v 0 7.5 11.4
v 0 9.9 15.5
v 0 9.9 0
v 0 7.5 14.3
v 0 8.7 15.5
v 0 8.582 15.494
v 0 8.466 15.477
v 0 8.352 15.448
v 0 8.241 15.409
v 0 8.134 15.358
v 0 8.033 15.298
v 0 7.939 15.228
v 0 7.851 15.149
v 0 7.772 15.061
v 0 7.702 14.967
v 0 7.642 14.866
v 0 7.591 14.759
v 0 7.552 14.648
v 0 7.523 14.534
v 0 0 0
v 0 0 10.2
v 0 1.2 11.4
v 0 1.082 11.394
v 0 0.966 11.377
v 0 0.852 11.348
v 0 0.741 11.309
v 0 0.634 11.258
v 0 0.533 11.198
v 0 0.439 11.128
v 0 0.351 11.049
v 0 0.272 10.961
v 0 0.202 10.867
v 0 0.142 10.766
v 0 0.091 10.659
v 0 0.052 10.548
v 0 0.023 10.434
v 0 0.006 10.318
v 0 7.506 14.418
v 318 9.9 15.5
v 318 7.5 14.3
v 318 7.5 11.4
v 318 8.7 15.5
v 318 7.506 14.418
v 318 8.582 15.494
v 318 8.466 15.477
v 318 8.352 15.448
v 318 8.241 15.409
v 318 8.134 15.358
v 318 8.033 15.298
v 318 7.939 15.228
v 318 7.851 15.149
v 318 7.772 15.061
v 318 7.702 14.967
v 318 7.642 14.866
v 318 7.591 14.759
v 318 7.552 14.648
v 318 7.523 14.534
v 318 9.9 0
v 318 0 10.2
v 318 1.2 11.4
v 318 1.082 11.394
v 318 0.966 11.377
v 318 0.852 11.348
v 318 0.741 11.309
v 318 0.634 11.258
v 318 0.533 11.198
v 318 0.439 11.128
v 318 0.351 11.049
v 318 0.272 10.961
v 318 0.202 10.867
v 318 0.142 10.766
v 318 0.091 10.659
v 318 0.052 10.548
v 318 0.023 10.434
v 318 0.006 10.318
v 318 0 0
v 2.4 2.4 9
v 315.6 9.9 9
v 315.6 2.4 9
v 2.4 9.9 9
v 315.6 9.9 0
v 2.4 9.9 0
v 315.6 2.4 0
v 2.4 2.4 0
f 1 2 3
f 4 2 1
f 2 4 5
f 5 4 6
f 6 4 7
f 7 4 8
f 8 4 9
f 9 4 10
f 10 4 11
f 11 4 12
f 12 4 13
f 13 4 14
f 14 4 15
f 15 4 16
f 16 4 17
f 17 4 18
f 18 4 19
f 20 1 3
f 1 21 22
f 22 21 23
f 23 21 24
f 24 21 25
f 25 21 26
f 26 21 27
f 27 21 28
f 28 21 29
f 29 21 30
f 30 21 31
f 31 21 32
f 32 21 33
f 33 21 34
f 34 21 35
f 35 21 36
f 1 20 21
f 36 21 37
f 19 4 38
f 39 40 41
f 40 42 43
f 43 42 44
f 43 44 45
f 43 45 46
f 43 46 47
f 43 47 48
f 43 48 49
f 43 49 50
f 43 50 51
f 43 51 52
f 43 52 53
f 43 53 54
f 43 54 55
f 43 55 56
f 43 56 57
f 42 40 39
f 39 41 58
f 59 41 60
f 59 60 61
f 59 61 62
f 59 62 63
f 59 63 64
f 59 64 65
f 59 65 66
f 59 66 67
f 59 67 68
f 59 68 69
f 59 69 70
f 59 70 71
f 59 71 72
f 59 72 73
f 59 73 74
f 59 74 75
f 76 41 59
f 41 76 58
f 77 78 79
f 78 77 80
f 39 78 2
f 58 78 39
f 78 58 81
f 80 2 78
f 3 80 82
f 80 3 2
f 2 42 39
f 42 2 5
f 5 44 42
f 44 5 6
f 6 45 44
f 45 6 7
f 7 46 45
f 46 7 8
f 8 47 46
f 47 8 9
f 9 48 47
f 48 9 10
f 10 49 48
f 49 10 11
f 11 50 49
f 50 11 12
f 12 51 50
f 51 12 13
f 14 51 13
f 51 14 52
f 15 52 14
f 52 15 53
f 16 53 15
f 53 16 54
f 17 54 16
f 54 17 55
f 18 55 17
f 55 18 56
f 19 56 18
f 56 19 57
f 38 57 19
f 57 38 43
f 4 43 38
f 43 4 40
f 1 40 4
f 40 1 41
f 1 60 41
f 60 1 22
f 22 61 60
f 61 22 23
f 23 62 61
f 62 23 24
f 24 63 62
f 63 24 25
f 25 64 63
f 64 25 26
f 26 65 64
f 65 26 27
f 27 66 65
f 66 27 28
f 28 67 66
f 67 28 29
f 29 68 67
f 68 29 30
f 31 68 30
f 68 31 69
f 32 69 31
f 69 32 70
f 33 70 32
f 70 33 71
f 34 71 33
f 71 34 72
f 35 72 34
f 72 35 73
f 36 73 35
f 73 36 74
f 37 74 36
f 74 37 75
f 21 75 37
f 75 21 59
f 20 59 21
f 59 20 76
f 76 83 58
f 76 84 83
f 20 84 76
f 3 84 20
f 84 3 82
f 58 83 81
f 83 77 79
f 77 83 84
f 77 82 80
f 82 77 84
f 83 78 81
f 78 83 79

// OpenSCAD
//Leiste mit nach vorne gewoelbter Ausbuchtung, die bis zum Boden reicht.
//Die Ausbuchtung ist nach hinten und nach unten offen.
//Profil von der Seite (vorne links, hinten rechts):
//
//        ██
//        ██
//  ████████
//  ██
//  ██
//  ██

/* [Masse] */

//Gesamthoehe der Leiste inkl. Ausbuchtung
hoehe_leiste=15.5; // [5:0.1:50]

//Hoehe der Ausbuchtung, innen gemessen vom Boden
hoehe_ausbuchtung=9; // [3:0.1:50]

//Tiefe der Ausbuchtung, innen gemessen ab Rueckseite der Leiste
tiefe_ausbuchtung=7.5; // [3:0.1:50]

//Breite der gesamten Leiste
breite_leiste=318; // [10:1:500]

//Dicke der Leiste oben und der Wand um die Ausbuchtung
dicke=2.4; // [0.4:0.1:5]

//Radius der vorderen Kante ganz oben und der vorderen Kante der Ausbuchtung
//(wird auf die Dicke und die freie Hoehe der Leiste begrenzt)
radius=1.2; // [0.1:0.1:5]

/* [Druck] */

//Welches Teil: "alles" oder ein Drittel. Links und rechts sind aussen geschlossen, die Mitte ist beidseitig offen.
teil="alles"; // [alles, links, mitte, rechts]

/* [Hidden] */

//Radius darf nicht groesser als die Wand oder die freie Hoehe der Leiste sein
r=min(radius, dicke, hoehe_leiste-hoehe_ausbuchtung-dicke);

//Segmente pro Rundung
segmente=16;

//Viertelkreis um [cx, cy] von Winkel a0 nach a1
function bogen(cx, cy, a0, a1) =
    [for(i=[0:segmente]) let(a=a0+(a1-a0)*i/segmente) [cx+r*cos(a), cy+r*sin(a)]];


module profil()
{
    polygon(concat(
        [[tiefe_ausbuchtung+dicke, hoehe_leiste]],
        //vordere Kante ganz oben
        bogen(tiefe_ausbuchtung+r, hoehe_leiste-r, 90, 180),
        [[tiefe_ausbuchtung, hoehe_ausbuchtung+dicke]],
        //vordere Kante der Ausbuchtung
        bogen(r, hoehe_ausbuchtung+dicke-r, 90, 180),
        [
            [0, 0],
            [dicke, 0],
            [dicke, hoehe_ausbuchtung],
            [tiefe_ausbuchtung+dicke, hoehe_ausbuchtung]
        ]
    ));
}

//Profil mit gefuellter Ausbuchtung, verschliesst die Seite
module deckel()
{
    union()
    {
        profil();
        translate([dicke, 0])
        square([tiefe_ausbuchtung, hoehe_ausbuchtung]);
    }
}

//x = Breite, y = Tiefe (y=0 ist vorne), z = Hoehe
module leiste(laenge, links_zu, rechts_zu)
{
    rotate([90,0,90])
    {
        linear_extrude(height=laenge)
        profil();

        if(links_zu)
        linear_extrude(height=dicke)
        deckel();

        if(rechts_zu)
        translate([0, 0, laenge-dicke])
        linear_extrude(height=dicke)
        deckel();
    }
}

if(teil=="links")
    leiste(breite_leiste/3, true, false);
else if(teil=="mitte")
    leiste(breite_leiste/3, false, false);
else if(teil=="rechts")
    leiste(breite_leiste/3, false, true);
else
    leiste(breite_leiste, true, true);
